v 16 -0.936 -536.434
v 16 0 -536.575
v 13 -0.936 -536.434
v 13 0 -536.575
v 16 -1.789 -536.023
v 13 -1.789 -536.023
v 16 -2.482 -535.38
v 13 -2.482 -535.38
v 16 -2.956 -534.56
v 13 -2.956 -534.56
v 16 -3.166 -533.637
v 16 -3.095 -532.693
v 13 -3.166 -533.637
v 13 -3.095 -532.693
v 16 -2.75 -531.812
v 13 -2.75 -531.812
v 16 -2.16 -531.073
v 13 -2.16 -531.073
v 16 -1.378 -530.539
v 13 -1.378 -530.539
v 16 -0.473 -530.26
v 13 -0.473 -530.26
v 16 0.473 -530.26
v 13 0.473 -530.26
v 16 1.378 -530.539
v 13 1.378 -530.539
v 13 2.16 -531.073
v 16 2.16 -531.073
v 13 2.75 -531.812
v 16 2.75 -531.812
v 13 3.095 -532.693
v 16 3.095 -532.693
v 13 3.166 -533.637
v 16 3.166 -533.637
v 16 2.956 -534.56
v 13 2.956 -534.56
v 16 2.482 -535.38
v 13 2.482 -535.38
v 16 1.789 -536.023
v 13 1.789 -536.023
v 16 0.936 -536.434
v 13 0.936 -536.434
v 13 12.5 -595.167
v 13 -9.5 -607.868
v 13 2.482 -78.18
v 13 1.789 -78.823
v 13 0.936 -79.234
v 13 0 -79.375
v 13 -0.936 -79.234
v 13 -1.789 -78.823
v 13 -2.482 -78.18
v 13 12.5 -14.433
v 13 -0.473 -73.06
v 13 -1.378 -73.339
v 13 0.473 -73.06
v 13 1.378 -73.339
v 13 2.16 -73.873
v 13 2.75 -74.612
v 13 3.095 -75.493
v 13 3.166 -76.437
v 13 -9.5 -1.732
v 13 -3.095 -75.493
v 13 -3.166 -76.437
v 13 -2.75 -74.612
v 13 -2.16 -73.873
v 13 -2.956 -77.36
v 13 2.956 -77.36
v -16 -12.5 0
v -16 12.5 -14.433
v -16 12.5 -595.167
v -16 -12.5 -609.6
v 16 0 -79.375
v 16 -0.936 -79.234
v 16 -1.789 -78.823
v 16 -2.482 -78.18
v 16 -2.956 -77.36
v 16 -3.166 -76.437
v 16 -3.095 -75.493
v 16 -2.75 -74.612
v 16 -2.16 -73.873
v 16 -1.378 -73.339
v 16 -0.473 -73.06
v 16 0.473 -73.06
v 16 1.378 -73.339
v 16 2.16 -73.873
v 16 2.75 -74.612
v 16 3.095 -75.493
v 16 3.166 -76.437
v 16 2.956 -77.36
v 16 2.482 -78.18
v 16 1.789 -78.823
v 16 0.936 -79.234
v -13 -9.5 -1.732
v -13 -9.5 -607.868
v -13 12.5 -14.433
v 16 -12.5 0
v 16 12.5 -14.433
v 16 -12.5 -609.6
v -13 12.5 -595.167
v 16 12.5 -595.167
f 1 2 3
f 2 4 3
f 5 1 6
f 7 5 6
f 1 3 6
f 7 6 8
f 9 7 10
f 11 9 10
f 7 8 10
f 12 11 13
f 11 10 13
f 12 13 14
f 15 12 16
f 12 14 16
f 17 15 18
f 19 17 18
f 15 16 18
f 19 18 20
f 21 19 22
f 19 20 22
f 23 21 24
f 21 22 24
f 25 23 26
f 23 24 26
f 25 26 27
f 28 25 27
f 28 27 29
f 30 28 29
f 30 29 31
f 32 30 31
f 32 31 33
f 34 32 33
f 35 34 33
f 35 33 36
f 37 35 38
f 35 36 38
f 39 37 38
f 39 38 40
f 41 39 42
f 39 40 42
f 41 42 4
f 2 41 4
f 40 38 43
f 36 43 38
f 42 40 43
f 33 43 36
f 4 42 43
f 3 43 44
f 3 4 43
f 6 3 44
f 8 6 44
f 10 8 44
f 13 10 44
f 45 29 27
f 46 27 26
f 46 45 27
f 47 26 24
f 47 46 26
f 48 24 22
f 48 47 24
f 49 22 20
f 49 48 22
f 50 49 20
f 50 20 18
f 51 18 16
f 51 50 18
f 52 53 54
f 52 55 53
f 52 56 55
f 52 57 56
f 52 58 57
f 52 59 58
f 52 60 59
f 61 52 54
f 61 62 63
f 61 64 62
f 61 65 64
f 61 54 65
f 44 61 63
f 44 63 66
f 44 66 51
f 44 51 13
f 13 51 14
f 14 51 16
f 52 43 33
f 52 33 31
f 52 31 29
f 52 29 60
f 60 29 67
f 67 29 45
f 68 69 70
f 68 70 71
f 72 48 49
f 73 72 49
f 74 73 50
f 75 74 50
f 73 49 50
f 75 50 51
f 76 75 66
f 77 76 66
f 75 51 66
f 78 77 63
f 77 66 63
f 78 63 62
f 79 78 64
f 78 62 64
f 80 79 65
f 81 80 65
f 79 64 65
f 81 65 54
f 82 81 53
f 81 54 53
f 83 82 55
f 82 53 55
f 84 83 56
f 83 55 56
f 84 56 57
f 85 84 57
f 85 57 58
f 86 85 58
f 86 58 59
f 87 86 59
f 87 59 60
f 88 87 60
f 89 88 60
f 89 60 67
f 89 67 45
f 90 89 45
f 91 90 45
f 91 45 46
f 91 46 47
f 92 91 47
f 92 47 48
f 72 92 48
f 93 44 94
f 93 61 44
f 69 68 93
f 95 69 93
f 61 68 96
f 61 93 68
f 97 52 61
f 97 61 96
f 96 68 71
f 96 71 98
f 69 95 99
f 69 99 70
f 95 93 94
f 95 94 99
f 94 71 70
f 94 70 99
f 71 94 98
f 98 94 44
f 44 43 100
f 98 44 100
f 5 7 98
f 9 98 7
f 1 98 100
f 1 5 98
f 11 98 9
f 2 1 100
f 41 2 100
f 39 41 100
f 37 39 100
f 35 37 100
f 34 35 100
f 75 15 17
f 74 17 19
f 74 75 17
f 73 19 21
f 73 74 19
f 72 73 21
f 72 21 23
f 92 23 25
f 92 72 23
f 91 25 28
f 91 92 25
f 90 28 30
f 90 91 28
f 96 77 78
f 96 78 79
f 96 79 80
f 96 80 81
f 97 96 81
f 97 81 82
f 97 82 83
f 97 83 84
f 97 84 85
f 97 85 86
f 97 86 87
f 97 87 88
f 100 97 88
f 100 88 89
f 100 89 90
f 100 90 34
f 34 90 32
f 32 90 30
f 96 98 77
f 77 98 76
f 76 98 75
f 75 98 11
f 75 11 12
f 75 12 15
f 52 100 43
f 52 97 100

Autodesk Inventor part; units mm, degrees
ref_plane "YZ Plane" through (0, 0, 0) normal (1, 0, 0) x (0, 1, 0)
ref_plane "XZ Plane" through (0, 0, 0) normal (0, 1, 0) x (-1, 0, 0)
ref_plane "XY Plane" through (0, 0, 0) normal (0, 0, 1) x (1, 0, 0)
sketch "Sketch1" plane through (0, 0, 0) normal (0, 0, 1) x (1, 0, 0)
  line L0 (-16, -12.5) -> (16, -12.5)
  line L1 (16, -12.5) -> (16, 12.5)
  line L2 (16, 12.5) -> (13, 12.5)
  line L3 (13, 12.5) -> (13, -9.5)
  line L4 (13, -9.5) -> (-13, -9.5)
  line L5 (-13, -9.5) -> (-13, 12.5)
  line L6 (-13, 12.5) -> (-16, 12.5)
  line L7 (-16, 12.5) -> (-16, -12.5)
  point P0 (0, 0)
  dimension "d0" = 32
  dimension "d1" = 25
  dimension "d2" = 3
  dimension "d3" = 90
  dimension "d4" = 22
  dimension "d5" = 26
  dimension "d6" = 22
  dimension "d7" = 3
  dimension "d8" = 25
  dimension "d10" = 12.5
  dimension "d11" = 16
extrude "Extrusion1" add sketch "Sketch1" against normal blind 609.6
chamfer "Chamfer1" distance 25 angle 30 1 edges at (14.5, 12.5, 0) measured on face at (4.3333, -11.5, 0)
chamfer "Chamfer2" distance 25 angle 30 1 edges at (14.5, 12.5, -609.6) measured on face at (4.3333, -11.5, -609.6)
sketch "Sketch3" plane through (16, -12.5, 0) normal (1, 0, 0) x (0, 0, -1)
  line L0 (595.1662, 25) -> (609.6, 0) projected
  line L1 (14.4338, 25) -> (595.1662, 25) projected
  line L2 (0, 0) -> (14.4338, 25) projected
  line L3 (0, 0) -> (609.6, 0) projected
  line L4 (0, 12.5) -> (609.6, 12.5) construction
  line L5 (68.9831, 0) -> (83.4169, 25) construction
  line L6 (526.1831, 25) -> (540.6169, 0) construction
  circle A0 centre (76.2, 12.5) radius 3.175
  circle A1 centre (533.4, 12.5) radius 3.175
  dimension "d62" = 6.35
  dimension "d63" = 6.35
  dimension "d64" = 76.2
  dimension "d65" = 76.2
hole "Hole4" at (16, 0, -76.2) at (16, 0, -533.4) direction (-1, 0, 0) diameter 6.35 depth 3 tip angle 118
equation "\"d5\" = d0 - 2 * d2"
equation "\"d10\" = 0.5 * d1"
equation "\"d11\" = 0.5 * d0"
equation "\"d65\" = d64"
properties part number "Chassis Rear Edge"
